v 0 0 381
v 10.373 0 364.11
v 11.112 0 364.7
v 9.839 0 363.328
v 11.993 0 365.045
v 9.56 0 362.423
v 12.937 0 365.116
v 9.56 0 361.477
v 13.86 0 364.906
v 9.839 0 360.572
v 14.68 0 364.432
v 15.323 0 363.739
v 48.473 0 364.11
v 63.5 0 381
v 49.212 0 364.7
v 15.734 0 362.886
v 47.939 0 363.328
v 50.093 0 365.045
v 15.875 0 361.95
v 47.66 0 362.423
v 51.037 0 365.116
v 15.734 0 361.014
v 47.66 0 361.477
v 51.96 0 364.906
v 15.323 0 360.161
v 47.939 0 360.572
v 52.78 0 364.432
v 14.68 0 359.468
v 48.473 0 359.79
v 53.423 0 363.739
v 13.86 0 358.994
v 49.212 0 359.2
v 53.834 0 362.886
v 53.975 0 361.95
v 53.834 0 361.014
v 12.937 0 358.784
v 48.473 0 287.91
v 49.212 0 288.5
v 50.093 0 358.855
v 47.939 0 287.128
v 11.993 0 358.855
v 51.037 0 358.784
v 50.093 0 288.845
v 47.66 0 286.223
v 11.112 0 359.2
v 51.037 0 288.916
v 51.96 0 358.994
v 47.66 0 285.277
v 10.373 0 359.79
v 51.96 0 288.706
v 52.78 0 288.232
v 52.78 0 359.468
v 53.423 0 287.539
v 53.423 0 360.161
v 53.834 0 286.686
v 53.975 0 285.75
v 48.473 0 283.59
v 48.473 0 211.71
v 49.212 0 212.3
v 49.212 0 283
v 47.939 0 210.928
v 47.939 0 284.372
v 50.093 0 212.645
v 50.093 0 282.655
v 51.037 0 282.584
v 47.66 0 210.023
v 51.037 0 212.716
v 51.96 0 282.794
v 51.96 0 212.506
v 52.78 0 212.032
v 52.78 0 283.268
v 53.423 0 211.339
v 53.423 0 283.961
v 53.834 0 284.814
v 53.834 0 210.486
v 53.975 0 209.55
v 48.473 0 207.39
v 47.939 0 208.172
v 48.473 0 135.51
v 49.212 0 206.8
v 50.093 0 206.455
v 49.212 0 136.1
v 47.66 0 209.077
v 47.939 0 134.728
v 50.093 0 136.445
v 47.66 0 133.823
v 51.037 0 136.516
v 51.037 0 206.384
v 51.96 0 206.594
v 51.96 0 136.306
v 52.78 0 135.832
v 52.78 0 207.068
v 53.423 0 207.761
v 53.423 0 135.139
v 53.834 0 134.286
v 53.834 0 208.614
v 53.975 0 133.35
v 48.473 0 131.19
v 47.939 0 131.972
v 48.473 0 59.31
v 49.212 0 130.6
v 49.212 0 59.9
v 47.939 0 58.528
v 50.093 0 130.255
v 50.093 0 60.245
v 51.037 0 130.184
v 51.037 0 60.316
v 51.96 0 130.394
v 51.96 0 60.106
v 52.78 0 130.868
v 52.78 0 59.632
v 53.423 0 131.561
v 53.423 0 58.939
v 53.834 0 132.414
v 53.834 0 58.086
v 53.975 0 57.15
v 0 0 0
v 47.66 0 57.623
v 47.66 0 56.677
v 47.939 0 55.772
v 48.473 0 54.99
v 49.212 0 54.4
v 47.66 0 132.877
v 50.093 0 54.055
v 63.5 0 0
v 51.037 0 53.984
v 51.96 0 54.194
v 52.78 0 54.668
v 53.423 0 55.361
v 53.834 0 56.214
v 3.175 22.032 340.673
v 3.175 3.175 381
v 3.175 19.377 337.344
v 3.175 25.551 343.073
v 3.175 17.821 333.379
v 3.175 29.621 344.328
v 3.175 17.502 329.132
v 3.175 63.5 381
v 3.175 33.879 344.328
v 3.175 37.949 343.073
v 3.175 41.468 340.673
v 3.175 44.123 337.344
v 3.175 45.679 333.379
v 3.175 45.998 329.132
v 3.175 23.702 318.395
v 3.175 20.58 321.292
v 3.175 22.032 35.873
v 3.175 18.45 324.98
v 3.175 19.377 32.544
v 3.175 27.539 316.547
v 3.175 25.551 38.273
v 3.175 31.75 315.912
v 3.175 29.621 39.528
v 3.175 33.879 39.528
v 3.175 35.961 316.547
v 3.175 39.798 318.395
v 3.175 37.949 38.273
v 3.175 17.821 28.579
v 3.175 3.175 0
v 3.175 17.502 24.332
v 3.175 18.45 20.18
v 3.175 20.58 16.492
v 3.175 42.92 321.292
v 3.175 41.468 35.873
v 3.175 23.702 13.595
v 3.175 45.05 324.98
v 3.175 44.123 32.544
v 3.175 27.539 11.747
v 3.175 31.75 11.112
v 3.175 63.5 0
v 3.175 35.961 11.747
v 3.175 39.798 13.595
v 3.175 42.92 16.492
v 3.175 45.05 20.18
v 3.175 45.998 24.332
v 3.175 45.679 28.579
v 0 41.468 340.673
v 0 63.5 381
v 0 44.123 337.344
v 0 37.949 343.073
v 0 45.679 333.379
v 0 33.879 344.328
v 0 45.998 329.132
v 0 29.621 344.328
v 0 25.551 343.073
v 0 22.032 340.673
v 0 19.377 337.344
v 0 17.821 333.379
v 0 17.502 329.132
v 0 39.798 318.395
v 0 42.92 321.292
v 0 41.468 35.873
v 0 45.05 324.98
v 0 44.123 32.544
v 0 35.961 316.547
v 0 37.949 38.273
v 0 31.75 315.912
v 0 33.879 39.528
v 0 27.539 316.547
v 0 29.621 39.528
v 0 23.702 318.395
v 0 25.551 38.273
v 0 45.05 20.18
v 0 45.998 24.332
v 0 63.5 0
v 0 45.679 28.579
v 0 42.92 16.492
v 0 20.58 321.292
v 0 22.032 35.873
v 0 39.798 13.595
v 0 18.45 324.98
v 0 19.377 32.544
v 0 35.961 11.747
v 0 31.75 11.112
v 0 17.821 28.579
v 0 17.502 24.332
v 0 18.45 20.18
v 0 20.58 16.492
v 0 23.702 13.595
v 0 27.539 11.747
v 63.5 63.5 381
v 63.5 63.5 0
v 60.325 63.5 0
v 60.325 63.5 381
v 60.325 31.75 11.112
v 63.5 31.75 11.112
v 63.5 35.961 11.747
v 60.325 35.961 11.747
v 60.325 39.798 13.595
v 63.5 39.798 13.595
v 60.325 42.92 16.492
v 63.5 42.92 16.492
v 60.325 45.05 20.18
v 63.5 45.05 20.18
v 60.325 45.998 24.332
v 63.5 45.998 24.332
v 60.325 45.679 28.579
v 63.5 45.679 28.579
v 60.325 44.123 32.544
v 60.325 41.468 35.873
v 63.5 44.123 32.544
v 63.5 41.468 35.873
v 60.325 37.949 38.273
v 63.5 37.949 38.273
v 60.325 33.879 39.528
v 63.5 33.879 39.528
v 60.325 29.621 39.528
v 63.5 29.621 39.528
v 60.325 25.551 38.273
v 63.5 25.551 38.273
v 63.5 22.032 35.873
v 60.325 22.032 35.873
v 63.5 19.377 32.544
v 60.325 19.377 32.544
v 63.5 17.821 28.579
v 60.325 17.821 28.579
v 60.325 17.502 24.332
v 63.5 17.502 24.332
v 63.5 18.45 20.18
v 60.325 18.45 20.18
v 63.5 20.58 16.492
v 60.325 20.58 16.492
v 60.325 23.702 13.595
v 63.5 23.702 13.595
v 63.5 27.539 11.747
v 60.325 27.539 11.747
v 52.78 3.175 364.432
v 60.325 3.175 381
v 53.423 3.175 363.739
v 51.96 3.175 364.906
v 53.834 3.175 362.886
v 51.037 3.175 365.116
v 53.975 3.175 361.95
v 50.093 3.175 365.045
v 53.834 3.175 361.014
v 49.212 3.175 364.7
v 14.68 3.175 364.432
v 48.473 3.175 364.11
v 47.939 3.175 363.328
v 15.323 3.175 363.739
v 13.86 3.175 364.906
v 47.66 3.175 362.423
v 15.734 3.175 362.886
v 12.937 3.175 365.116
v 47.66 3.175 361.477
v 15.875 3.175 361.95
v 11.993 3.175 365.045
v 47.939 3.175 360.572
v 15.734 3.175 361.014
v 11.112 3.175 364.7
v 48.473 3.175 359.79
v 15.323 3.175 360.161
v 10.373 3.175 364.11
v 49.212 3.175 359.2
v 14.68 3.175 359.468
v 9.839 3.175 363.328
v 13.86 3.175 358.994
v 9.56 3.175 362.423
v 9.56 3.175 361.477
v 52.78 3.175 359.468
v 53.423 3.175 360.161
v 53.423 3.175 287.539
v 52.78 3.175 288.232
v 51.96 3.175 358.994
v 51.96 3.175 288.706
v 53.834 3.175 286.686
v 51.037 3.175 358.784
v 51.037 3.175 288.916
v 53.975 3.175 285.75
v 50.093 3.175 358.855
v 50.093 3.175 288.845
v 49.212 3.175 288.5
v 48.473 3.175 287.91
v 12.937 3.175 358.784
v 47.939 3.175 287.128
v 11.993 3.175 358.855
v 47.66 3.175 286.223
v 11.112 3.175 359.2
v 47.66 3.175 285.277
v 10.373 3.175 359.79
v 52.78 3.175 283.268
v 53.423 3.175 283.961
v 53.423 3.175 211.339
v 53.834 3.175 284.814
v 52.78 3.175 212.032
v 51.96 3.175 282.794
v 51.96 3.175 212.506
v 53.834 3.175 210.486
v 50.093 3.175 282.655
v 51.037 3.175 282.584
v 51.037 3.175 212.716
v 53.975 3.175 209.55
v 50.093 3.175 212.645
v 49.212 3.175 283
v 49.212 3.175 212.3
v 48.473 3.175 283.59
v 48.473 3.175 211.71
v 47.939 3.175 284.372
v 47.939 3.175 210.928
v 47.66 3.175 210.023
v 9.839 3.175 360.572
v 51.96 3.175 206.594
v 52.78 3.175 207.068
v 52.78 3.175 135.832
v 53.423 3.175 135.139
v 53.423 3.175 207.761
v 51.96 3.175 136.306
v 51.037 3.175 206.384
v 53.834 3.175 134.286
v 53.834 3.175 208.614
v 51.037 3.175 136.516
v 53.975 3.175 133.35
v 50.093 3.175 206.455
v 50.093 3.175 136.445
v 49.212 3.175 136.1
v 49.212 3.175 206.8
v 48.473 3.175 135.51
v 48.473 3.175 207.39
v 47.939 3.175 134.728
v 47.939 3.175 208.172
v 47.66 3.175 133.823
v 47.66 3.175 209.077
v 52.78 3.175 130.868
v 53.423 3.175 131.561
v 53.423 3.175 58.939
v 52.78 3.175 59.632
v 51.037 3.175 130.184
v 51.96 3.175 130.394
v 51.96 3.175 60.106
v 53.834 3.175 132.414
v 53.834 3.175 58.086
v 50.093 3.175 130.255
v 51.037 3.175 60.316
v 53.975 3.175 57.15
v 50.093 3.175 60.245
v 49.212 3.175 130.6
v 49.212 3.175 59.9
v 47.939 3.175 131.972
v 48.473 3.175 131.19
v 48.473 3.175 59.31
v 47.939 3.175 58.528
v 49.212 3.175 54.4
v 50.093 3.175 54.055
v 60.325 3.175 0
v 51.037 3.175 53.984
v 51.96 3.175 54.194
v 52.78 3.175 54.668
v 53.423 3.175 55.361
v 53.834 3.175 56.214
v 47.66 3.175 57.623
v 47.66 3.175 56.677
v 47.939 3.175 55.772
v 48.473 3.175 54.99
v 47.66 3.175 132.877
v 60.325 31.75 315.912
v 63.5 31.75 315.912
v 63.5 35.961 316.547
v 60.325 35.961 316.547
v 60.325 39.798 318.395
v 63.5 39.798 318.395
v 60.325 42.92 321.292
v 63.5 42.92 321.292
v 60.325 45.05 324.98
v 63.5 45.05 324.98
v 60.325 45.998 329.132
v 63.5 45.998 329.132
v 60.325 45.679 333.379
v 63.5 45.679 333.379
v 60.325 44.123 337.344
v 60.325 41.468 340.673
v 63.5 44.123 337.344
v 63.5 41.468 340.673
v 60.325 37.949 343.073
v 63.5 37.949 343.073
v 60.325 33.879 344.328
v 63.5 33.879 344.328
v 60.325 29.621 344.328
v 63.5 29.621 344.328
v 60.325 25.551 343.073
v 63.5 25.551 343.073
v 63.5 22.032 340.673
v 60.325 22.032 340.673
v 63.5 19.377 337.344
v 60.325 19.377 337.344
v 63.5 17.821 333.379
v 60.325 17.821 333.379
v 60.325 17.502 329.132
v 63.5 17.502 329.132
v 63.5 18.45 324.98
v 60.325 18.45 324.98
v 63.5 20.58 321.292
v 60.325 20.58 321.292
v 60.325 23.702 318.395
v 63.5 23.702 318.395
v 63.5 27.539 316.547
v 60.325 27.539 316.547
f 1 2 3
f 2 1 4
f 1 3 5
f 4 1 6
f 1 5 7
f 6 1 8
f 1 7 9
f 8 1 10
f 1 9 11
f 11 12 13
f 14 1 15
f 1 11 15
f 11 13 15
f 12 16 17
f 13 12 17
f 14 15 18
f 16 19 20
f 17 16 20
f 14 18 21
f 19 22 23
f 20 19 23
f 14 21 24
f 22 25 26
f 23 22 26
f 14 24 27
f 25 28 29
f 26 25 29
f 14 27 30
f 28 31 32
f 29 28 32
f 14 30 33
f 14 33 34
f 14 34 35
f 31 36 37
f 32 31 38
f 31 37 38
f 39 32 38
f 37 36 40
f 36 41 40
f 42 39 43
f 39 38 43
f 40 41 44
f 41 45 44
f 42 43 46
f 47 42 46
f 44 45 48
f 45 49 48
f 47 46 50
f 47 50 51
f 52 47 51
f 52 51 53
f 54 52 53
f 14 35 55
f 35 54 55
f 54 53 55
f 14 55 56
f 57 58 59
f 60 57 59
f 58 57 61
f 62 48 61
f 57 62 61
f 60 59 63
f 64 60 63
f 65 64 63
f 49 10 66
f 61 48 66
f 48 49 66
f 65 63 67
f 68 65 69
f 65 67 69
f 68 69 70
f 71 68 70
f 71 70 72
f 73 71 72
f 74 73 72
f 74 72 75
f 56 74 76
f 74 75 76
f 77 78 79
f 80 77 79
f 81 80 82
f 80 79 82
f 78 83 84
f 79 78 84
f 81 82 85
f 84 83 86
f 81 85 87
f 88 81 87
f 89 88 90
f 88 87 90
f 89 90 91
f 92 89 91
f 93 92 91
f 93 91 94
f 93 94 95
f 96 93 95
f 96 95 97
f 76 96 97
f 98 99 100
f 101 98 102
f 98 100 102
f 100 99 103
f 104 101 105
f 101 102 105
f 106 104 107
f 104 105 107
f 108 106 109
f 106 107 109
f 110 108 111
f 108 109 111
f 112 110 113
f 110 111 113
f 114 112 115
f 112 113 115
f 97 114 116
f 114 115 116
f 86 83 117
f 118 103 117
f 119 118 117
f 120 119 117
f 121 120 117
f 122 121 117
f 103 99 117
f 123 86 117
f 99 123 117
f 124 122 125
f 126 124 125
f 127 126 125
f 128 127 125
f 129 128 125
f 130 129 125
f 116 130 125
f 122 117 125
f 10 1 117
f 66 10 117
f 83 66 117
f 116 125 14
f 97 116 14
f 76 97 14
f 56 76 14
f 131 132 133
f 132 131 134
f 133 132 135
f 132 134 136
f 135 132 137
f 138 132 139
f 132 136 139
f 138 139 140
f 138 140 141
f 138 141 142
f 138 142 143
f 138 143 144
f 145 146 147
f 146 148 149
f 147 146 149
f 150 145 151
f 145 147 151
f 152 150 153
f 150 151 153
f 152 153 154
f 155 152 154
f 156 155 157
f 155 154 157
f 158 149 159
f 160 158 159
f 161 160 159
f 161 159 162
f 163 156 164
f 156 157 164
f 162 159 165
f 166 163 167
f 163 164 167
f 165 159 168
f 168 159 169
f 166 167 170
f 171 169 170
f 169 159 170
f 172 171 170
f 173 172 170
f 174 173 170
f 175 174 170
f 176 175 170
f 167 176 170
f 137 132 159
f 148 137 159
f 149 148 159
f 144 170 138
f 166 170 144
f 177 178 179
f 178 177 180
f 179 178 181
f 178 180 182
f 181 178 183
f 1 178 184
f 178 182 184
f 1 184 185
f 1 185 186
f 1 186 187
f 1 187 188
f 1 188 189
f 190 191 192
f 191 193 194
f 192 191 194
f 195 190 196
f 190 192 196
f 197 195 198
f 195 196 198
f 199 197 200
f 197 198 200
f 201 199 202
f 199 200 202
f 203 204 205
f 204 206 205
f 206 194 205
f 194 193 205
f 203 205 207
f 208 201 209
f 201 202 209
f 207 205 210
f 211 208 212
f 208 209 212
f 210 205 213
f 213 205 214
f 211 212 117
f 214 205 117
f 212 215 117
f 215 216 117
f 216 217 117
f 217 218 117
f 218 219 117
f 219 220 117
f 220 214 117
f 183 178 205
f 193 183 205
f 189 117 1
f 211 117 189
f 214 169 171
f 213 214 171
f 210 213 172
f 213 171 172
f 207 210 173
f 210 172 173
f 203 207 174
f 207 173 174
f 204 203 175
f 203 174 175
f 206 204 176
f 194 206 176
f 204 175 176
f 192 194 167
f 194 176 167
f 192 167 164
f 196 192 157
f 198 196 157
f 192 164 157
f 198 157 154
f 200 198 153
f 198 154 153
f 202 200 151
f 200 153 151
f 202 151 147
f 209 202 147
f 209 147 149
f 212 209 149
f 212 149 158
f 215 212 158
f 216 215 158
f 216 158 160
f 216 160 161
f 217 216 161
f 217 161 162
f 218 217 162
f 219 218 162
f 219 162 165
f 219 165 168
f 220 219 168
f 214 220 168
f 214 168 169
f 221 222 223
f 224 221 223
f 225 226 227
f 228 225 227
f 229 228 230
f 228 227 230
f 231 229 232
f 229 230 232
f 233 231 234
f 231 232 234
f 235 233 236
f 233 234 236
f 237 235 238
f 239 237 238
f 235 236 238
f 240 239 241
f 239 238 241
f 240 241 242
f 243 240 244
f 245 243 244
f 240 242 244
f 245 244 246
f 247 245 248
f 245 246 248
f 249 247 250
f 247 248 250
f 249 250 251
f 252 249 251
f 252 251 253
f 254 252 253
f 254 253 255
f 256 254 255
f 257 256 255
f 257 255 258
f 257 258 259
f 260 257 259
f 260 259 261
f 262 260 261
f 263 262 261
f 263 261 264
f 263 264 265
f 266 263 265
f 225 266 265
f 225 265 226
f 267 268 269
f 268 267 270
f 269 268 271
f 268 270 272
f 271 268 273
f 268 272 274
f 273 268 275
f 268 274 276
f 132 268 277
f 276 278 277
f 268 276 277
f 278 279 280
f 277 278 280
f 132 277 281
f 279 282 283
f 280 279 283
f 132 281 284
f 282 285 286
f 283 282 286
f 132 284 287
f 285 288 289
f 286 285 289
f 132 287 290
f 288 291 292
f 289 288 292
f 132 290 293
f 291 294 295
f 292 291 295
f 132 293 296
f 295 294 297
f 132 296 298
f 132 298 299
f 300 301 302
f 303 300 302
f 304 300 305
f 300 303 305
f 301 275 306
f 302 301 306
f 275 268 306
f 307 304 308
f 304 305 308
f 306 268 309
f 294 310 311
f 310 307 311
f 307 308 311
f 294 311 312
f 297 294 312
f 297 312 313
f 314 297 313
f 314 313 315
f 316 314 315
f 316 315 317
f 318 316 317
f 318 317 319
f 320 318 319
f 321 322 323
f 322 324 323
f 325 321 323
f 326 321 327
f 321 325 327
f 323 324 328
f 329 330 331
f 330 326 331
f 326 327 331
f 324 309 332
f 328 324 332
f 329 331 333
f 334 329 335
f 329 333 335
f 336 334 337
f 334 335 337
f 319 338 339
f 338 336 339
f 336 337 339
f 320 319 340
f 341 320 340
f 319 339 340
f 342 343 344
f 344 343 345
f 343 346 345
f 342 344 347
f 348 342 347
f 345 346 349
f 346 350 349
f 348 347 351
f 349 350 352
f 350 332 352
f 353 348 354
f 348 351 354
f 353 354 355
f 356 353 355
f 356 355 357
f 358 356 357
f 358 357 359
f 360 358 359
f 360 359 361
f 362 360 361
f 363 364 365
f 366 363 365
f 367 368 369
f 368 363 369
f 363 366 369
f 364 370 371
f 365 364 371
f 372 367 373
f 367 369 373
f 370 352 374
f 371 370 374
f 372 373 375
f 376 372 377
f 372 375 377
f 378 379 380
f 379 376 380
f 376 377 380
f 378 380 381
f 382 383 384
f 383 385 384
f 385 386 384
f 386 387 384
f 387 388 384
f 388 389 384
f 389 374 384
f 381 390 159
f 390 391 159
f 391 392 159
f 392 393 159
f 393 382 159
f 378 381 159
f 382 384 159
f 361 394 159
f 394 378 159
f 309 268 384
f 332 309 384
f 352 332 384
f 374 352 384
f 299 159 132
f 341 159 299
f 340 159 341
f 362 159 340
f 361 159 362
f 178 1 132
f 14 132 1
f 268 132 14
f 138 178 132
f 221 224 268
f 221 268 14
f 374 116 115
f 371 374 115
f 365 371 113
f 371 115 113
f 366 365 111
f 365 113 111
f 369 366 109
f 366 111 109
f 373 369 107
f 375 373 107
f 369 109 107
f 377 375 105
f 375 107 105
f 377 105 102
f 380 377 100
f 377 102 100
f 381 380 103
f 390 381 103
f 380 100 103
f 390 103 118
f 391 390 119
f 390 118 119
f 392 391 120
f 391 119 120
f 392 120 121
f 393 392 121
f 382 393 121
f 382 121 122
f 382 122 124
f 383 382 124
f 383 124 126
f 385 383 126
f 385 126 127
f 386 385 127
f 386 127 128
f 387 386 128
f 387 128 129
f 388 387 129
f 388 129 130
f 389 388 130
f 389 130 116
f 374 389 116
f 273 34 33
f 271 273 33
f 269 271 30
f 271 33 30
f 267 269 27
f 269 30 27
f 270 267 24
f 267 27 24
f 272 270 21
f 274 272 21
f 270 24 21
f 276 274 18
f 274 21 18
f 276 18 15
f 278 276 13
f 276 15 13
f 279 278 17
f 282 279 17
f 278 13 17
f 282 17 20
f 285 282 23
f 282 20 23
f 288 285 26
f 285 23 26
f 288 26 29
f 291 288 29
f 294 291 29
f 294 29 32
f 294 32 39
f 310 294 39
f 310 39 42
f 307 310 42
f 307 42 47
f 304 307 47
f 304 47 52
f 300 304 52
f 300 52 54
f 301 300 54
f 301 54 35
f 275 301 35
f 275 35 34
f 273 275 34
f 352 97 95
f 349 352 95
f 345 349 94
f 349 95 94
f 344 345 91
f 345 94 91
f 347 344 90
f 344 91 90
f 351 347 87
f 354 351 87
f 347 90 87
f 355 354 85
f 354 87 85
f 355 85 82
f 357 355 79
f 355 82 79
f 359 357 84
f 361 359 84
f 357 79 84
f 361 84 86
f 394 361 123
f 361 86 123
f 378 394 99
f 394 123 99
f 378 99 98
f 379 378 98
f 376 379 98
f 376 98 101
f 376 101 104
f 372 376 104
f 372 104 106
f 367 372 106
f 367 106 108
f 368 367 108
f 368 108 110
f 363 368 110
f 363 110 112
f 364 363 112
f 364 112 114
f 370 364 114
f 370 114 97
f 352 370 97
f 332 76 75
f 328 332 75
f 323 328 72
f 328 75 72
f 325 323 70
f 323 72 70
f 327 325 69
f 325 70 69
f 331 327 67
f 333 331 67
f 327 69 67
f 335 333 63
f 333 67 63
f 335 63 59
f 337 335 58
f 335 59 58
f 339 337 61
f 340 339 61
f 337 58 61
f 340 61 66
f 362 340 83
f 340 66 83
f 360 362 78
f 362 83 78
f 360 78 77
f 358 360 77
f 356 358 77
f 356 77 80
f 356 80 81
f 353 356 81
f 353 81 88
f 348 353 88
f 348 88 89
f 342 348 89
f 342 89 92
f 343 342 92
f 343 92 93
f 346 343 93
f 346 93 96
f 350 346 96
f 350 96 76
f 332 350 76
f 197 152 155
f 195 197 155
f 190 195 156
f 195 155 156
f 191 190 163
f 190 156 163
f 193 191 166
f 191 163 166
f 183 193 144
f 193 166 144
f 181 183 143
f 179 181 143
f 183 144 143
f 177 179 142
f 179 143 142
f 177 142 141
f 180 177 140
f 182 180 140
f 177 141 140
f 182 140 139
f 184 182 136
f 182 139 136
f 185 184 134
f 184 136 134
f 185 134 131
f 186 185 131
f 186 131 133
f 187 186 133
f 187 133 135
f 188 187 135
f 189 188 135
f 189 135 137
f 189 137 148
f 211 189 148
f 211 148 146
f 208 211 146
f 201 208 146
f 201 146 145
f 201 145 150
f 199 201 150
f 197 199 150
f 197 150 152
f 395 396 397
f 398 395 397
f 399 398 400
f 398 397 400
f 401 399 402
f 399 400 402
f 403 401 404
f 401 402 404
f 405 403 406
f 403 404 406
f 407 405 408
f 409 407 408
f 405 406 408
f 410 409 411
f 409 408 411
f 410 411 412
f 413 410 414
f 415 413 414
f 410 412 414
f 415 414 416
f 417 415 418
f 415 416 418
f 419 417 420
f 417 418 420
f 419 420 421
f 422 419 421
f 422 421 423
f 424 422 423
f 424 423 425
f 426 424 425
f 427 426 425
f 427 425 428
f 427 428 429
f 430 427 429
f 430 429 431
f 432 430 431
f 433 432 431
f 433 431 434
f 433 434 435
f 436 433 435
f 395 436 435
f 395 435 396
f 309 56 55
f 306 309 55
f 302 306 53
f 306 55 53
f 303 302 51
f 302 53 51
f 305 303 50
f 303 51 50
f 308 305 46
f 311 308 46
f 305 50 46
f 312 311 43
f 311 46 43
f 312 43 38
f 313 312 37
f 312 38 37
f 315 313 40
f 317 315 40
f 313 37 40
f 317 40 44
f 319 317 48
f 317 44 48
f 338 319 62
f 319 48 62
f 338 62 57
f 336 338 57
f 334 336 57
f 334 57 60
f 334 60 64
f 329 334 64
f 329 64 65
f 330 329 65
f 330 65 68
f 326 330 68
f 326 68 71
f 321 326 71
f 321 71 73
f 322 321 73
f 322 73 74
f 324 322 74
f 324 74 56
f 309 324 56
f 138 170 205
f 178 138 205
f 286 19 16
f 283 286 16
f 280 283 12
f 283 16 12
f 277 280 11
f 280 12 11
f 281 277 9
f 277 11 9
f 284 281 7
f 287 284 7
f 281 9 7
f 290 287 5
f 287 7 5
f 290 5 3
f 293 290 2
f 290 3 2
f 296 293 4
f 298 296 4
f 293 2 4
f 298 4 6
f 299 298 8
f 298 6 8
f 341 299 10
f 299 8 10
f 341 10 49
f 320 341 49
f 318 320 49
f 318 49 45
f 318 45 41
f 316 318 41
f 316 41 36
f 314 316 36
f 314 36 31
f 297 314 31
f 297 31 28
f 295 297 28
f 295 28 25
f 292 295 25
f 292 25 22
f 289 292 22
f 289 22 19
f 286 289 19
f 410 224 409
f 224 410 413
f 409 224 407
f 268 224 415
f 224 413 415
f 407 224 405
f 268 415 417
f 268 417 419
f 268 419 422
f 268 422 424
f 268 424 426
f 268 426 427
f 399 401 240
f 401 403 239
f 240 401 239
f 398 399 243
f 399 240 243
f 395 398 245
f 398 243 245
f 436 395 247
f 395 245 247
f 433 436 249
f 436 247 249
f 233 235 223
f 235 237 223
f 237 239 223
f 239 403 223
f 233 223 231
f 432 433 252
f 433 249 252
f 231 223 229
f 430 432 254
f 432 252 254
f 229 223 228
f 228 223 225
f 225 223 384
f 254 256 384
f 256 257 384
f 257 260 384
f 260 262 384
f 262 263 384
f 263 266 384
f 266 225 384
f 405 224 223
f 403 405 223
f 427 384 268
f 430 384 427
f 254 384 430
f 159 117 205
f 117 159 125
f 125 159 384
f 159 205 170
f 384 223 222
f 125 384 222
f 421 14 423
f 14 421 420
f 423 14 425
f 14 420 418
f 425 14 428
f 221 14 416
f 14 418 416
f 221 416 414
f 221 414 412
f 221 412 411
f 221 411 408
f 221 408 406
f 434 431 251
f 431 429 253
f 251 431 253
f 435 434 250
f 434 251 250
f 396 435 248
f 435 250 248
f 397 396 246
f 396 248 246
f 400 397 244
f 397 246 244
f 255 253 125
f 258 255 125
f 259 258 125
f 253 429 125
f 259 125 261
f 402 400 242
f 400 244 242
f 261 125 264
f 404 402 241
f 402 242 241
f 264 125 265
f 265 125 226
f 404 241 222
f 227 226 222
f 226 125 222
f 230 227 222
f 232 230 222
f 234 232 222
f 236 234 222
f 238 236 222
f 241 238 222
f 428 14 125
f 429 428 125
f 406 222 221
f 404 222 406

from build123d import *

# Parameters (mm, degrees)
BOSS_EXTRUDE1_DEPTH     = 381
SKETCH2_R               = 3.175
CUT_EXTRUDE1_DEPTH      = 1
CUT_EXTRUDE1_DEPTH_BACK = 64.5
SKETCH3_R               = 14.2875
CUT_EXTRUDE2_DEPTH      = 1
CUT_EXTRUDE2_DEPTH_BACK = 64.5


with BuildPart() as part:
    # Sketch1 → Boss-Extrude1 (new body)
    with BuildSketch(Plane.XY):
        Polygon((0, 0), (63.5, 0), (63.5, 63.5), (60.325, 63.5), (60.325, 3.175), (3.175, 3.175), (3.175, 63.5), (0, 63.5), align=None)
    extrude(amount=BOSS_EXTRUDE1_DEPTH)

    # Sketch2 → Cut-Extrude1 (cut, two sides)
    with BuildSketch(Plane.XZ) as cut_extrude1_sk:
        with Locations((12.7, 361.95)):
            Circle(SKETCH2_R)
        with Locations((50.8, 361.95)):
            Circle(SKETCH2_R)
        with Locations((50.8, 285.75)):
            Circle(SKETCH2_R)
        with Locations((50.8, 209.55)):
            Circle(SKETCH2_R)
        with Locations((50.8, 133.35)):
            Circle(SKETCH2_R)
        with Locations((50.8, 57.15)):
            Circle(SKETCH2_R)
    extrude(amount=CUT_EXTRUDE1_DEPTH, mode=Mode.SUBTRACT)
    extrude(cut_extrude1_sk.sketch, amount=-CUT_EXTRUDE1_DEPTH_BACK, mode=Mode.SUBTRACT)

    # Sketch3 → Cut-Extrude2 (cut, two sides)
    with BuildSketch(Plane(origin=(63.5, 0, 0), x_dir=(0, 0, -1), z_dir=(1, 0, 0))) as cut_extrude2_sk:
        with Locations((-25.4, 31.75)):
            Circle(SKETCH3_R)
        with Locations((-330.2, 31.75)):
            Circle(SKETCH3_R)
    extrude(amount=CUT_EXTRUDE2_DEPTH, mode=Mode.SUBTRACT)
    extrude(cut_extrude2_sk.sketch, amount=-CUT_EXTRUDE2_DEPTH_BACK, mode=Mode.SUBTRACT)


solid = part.part
